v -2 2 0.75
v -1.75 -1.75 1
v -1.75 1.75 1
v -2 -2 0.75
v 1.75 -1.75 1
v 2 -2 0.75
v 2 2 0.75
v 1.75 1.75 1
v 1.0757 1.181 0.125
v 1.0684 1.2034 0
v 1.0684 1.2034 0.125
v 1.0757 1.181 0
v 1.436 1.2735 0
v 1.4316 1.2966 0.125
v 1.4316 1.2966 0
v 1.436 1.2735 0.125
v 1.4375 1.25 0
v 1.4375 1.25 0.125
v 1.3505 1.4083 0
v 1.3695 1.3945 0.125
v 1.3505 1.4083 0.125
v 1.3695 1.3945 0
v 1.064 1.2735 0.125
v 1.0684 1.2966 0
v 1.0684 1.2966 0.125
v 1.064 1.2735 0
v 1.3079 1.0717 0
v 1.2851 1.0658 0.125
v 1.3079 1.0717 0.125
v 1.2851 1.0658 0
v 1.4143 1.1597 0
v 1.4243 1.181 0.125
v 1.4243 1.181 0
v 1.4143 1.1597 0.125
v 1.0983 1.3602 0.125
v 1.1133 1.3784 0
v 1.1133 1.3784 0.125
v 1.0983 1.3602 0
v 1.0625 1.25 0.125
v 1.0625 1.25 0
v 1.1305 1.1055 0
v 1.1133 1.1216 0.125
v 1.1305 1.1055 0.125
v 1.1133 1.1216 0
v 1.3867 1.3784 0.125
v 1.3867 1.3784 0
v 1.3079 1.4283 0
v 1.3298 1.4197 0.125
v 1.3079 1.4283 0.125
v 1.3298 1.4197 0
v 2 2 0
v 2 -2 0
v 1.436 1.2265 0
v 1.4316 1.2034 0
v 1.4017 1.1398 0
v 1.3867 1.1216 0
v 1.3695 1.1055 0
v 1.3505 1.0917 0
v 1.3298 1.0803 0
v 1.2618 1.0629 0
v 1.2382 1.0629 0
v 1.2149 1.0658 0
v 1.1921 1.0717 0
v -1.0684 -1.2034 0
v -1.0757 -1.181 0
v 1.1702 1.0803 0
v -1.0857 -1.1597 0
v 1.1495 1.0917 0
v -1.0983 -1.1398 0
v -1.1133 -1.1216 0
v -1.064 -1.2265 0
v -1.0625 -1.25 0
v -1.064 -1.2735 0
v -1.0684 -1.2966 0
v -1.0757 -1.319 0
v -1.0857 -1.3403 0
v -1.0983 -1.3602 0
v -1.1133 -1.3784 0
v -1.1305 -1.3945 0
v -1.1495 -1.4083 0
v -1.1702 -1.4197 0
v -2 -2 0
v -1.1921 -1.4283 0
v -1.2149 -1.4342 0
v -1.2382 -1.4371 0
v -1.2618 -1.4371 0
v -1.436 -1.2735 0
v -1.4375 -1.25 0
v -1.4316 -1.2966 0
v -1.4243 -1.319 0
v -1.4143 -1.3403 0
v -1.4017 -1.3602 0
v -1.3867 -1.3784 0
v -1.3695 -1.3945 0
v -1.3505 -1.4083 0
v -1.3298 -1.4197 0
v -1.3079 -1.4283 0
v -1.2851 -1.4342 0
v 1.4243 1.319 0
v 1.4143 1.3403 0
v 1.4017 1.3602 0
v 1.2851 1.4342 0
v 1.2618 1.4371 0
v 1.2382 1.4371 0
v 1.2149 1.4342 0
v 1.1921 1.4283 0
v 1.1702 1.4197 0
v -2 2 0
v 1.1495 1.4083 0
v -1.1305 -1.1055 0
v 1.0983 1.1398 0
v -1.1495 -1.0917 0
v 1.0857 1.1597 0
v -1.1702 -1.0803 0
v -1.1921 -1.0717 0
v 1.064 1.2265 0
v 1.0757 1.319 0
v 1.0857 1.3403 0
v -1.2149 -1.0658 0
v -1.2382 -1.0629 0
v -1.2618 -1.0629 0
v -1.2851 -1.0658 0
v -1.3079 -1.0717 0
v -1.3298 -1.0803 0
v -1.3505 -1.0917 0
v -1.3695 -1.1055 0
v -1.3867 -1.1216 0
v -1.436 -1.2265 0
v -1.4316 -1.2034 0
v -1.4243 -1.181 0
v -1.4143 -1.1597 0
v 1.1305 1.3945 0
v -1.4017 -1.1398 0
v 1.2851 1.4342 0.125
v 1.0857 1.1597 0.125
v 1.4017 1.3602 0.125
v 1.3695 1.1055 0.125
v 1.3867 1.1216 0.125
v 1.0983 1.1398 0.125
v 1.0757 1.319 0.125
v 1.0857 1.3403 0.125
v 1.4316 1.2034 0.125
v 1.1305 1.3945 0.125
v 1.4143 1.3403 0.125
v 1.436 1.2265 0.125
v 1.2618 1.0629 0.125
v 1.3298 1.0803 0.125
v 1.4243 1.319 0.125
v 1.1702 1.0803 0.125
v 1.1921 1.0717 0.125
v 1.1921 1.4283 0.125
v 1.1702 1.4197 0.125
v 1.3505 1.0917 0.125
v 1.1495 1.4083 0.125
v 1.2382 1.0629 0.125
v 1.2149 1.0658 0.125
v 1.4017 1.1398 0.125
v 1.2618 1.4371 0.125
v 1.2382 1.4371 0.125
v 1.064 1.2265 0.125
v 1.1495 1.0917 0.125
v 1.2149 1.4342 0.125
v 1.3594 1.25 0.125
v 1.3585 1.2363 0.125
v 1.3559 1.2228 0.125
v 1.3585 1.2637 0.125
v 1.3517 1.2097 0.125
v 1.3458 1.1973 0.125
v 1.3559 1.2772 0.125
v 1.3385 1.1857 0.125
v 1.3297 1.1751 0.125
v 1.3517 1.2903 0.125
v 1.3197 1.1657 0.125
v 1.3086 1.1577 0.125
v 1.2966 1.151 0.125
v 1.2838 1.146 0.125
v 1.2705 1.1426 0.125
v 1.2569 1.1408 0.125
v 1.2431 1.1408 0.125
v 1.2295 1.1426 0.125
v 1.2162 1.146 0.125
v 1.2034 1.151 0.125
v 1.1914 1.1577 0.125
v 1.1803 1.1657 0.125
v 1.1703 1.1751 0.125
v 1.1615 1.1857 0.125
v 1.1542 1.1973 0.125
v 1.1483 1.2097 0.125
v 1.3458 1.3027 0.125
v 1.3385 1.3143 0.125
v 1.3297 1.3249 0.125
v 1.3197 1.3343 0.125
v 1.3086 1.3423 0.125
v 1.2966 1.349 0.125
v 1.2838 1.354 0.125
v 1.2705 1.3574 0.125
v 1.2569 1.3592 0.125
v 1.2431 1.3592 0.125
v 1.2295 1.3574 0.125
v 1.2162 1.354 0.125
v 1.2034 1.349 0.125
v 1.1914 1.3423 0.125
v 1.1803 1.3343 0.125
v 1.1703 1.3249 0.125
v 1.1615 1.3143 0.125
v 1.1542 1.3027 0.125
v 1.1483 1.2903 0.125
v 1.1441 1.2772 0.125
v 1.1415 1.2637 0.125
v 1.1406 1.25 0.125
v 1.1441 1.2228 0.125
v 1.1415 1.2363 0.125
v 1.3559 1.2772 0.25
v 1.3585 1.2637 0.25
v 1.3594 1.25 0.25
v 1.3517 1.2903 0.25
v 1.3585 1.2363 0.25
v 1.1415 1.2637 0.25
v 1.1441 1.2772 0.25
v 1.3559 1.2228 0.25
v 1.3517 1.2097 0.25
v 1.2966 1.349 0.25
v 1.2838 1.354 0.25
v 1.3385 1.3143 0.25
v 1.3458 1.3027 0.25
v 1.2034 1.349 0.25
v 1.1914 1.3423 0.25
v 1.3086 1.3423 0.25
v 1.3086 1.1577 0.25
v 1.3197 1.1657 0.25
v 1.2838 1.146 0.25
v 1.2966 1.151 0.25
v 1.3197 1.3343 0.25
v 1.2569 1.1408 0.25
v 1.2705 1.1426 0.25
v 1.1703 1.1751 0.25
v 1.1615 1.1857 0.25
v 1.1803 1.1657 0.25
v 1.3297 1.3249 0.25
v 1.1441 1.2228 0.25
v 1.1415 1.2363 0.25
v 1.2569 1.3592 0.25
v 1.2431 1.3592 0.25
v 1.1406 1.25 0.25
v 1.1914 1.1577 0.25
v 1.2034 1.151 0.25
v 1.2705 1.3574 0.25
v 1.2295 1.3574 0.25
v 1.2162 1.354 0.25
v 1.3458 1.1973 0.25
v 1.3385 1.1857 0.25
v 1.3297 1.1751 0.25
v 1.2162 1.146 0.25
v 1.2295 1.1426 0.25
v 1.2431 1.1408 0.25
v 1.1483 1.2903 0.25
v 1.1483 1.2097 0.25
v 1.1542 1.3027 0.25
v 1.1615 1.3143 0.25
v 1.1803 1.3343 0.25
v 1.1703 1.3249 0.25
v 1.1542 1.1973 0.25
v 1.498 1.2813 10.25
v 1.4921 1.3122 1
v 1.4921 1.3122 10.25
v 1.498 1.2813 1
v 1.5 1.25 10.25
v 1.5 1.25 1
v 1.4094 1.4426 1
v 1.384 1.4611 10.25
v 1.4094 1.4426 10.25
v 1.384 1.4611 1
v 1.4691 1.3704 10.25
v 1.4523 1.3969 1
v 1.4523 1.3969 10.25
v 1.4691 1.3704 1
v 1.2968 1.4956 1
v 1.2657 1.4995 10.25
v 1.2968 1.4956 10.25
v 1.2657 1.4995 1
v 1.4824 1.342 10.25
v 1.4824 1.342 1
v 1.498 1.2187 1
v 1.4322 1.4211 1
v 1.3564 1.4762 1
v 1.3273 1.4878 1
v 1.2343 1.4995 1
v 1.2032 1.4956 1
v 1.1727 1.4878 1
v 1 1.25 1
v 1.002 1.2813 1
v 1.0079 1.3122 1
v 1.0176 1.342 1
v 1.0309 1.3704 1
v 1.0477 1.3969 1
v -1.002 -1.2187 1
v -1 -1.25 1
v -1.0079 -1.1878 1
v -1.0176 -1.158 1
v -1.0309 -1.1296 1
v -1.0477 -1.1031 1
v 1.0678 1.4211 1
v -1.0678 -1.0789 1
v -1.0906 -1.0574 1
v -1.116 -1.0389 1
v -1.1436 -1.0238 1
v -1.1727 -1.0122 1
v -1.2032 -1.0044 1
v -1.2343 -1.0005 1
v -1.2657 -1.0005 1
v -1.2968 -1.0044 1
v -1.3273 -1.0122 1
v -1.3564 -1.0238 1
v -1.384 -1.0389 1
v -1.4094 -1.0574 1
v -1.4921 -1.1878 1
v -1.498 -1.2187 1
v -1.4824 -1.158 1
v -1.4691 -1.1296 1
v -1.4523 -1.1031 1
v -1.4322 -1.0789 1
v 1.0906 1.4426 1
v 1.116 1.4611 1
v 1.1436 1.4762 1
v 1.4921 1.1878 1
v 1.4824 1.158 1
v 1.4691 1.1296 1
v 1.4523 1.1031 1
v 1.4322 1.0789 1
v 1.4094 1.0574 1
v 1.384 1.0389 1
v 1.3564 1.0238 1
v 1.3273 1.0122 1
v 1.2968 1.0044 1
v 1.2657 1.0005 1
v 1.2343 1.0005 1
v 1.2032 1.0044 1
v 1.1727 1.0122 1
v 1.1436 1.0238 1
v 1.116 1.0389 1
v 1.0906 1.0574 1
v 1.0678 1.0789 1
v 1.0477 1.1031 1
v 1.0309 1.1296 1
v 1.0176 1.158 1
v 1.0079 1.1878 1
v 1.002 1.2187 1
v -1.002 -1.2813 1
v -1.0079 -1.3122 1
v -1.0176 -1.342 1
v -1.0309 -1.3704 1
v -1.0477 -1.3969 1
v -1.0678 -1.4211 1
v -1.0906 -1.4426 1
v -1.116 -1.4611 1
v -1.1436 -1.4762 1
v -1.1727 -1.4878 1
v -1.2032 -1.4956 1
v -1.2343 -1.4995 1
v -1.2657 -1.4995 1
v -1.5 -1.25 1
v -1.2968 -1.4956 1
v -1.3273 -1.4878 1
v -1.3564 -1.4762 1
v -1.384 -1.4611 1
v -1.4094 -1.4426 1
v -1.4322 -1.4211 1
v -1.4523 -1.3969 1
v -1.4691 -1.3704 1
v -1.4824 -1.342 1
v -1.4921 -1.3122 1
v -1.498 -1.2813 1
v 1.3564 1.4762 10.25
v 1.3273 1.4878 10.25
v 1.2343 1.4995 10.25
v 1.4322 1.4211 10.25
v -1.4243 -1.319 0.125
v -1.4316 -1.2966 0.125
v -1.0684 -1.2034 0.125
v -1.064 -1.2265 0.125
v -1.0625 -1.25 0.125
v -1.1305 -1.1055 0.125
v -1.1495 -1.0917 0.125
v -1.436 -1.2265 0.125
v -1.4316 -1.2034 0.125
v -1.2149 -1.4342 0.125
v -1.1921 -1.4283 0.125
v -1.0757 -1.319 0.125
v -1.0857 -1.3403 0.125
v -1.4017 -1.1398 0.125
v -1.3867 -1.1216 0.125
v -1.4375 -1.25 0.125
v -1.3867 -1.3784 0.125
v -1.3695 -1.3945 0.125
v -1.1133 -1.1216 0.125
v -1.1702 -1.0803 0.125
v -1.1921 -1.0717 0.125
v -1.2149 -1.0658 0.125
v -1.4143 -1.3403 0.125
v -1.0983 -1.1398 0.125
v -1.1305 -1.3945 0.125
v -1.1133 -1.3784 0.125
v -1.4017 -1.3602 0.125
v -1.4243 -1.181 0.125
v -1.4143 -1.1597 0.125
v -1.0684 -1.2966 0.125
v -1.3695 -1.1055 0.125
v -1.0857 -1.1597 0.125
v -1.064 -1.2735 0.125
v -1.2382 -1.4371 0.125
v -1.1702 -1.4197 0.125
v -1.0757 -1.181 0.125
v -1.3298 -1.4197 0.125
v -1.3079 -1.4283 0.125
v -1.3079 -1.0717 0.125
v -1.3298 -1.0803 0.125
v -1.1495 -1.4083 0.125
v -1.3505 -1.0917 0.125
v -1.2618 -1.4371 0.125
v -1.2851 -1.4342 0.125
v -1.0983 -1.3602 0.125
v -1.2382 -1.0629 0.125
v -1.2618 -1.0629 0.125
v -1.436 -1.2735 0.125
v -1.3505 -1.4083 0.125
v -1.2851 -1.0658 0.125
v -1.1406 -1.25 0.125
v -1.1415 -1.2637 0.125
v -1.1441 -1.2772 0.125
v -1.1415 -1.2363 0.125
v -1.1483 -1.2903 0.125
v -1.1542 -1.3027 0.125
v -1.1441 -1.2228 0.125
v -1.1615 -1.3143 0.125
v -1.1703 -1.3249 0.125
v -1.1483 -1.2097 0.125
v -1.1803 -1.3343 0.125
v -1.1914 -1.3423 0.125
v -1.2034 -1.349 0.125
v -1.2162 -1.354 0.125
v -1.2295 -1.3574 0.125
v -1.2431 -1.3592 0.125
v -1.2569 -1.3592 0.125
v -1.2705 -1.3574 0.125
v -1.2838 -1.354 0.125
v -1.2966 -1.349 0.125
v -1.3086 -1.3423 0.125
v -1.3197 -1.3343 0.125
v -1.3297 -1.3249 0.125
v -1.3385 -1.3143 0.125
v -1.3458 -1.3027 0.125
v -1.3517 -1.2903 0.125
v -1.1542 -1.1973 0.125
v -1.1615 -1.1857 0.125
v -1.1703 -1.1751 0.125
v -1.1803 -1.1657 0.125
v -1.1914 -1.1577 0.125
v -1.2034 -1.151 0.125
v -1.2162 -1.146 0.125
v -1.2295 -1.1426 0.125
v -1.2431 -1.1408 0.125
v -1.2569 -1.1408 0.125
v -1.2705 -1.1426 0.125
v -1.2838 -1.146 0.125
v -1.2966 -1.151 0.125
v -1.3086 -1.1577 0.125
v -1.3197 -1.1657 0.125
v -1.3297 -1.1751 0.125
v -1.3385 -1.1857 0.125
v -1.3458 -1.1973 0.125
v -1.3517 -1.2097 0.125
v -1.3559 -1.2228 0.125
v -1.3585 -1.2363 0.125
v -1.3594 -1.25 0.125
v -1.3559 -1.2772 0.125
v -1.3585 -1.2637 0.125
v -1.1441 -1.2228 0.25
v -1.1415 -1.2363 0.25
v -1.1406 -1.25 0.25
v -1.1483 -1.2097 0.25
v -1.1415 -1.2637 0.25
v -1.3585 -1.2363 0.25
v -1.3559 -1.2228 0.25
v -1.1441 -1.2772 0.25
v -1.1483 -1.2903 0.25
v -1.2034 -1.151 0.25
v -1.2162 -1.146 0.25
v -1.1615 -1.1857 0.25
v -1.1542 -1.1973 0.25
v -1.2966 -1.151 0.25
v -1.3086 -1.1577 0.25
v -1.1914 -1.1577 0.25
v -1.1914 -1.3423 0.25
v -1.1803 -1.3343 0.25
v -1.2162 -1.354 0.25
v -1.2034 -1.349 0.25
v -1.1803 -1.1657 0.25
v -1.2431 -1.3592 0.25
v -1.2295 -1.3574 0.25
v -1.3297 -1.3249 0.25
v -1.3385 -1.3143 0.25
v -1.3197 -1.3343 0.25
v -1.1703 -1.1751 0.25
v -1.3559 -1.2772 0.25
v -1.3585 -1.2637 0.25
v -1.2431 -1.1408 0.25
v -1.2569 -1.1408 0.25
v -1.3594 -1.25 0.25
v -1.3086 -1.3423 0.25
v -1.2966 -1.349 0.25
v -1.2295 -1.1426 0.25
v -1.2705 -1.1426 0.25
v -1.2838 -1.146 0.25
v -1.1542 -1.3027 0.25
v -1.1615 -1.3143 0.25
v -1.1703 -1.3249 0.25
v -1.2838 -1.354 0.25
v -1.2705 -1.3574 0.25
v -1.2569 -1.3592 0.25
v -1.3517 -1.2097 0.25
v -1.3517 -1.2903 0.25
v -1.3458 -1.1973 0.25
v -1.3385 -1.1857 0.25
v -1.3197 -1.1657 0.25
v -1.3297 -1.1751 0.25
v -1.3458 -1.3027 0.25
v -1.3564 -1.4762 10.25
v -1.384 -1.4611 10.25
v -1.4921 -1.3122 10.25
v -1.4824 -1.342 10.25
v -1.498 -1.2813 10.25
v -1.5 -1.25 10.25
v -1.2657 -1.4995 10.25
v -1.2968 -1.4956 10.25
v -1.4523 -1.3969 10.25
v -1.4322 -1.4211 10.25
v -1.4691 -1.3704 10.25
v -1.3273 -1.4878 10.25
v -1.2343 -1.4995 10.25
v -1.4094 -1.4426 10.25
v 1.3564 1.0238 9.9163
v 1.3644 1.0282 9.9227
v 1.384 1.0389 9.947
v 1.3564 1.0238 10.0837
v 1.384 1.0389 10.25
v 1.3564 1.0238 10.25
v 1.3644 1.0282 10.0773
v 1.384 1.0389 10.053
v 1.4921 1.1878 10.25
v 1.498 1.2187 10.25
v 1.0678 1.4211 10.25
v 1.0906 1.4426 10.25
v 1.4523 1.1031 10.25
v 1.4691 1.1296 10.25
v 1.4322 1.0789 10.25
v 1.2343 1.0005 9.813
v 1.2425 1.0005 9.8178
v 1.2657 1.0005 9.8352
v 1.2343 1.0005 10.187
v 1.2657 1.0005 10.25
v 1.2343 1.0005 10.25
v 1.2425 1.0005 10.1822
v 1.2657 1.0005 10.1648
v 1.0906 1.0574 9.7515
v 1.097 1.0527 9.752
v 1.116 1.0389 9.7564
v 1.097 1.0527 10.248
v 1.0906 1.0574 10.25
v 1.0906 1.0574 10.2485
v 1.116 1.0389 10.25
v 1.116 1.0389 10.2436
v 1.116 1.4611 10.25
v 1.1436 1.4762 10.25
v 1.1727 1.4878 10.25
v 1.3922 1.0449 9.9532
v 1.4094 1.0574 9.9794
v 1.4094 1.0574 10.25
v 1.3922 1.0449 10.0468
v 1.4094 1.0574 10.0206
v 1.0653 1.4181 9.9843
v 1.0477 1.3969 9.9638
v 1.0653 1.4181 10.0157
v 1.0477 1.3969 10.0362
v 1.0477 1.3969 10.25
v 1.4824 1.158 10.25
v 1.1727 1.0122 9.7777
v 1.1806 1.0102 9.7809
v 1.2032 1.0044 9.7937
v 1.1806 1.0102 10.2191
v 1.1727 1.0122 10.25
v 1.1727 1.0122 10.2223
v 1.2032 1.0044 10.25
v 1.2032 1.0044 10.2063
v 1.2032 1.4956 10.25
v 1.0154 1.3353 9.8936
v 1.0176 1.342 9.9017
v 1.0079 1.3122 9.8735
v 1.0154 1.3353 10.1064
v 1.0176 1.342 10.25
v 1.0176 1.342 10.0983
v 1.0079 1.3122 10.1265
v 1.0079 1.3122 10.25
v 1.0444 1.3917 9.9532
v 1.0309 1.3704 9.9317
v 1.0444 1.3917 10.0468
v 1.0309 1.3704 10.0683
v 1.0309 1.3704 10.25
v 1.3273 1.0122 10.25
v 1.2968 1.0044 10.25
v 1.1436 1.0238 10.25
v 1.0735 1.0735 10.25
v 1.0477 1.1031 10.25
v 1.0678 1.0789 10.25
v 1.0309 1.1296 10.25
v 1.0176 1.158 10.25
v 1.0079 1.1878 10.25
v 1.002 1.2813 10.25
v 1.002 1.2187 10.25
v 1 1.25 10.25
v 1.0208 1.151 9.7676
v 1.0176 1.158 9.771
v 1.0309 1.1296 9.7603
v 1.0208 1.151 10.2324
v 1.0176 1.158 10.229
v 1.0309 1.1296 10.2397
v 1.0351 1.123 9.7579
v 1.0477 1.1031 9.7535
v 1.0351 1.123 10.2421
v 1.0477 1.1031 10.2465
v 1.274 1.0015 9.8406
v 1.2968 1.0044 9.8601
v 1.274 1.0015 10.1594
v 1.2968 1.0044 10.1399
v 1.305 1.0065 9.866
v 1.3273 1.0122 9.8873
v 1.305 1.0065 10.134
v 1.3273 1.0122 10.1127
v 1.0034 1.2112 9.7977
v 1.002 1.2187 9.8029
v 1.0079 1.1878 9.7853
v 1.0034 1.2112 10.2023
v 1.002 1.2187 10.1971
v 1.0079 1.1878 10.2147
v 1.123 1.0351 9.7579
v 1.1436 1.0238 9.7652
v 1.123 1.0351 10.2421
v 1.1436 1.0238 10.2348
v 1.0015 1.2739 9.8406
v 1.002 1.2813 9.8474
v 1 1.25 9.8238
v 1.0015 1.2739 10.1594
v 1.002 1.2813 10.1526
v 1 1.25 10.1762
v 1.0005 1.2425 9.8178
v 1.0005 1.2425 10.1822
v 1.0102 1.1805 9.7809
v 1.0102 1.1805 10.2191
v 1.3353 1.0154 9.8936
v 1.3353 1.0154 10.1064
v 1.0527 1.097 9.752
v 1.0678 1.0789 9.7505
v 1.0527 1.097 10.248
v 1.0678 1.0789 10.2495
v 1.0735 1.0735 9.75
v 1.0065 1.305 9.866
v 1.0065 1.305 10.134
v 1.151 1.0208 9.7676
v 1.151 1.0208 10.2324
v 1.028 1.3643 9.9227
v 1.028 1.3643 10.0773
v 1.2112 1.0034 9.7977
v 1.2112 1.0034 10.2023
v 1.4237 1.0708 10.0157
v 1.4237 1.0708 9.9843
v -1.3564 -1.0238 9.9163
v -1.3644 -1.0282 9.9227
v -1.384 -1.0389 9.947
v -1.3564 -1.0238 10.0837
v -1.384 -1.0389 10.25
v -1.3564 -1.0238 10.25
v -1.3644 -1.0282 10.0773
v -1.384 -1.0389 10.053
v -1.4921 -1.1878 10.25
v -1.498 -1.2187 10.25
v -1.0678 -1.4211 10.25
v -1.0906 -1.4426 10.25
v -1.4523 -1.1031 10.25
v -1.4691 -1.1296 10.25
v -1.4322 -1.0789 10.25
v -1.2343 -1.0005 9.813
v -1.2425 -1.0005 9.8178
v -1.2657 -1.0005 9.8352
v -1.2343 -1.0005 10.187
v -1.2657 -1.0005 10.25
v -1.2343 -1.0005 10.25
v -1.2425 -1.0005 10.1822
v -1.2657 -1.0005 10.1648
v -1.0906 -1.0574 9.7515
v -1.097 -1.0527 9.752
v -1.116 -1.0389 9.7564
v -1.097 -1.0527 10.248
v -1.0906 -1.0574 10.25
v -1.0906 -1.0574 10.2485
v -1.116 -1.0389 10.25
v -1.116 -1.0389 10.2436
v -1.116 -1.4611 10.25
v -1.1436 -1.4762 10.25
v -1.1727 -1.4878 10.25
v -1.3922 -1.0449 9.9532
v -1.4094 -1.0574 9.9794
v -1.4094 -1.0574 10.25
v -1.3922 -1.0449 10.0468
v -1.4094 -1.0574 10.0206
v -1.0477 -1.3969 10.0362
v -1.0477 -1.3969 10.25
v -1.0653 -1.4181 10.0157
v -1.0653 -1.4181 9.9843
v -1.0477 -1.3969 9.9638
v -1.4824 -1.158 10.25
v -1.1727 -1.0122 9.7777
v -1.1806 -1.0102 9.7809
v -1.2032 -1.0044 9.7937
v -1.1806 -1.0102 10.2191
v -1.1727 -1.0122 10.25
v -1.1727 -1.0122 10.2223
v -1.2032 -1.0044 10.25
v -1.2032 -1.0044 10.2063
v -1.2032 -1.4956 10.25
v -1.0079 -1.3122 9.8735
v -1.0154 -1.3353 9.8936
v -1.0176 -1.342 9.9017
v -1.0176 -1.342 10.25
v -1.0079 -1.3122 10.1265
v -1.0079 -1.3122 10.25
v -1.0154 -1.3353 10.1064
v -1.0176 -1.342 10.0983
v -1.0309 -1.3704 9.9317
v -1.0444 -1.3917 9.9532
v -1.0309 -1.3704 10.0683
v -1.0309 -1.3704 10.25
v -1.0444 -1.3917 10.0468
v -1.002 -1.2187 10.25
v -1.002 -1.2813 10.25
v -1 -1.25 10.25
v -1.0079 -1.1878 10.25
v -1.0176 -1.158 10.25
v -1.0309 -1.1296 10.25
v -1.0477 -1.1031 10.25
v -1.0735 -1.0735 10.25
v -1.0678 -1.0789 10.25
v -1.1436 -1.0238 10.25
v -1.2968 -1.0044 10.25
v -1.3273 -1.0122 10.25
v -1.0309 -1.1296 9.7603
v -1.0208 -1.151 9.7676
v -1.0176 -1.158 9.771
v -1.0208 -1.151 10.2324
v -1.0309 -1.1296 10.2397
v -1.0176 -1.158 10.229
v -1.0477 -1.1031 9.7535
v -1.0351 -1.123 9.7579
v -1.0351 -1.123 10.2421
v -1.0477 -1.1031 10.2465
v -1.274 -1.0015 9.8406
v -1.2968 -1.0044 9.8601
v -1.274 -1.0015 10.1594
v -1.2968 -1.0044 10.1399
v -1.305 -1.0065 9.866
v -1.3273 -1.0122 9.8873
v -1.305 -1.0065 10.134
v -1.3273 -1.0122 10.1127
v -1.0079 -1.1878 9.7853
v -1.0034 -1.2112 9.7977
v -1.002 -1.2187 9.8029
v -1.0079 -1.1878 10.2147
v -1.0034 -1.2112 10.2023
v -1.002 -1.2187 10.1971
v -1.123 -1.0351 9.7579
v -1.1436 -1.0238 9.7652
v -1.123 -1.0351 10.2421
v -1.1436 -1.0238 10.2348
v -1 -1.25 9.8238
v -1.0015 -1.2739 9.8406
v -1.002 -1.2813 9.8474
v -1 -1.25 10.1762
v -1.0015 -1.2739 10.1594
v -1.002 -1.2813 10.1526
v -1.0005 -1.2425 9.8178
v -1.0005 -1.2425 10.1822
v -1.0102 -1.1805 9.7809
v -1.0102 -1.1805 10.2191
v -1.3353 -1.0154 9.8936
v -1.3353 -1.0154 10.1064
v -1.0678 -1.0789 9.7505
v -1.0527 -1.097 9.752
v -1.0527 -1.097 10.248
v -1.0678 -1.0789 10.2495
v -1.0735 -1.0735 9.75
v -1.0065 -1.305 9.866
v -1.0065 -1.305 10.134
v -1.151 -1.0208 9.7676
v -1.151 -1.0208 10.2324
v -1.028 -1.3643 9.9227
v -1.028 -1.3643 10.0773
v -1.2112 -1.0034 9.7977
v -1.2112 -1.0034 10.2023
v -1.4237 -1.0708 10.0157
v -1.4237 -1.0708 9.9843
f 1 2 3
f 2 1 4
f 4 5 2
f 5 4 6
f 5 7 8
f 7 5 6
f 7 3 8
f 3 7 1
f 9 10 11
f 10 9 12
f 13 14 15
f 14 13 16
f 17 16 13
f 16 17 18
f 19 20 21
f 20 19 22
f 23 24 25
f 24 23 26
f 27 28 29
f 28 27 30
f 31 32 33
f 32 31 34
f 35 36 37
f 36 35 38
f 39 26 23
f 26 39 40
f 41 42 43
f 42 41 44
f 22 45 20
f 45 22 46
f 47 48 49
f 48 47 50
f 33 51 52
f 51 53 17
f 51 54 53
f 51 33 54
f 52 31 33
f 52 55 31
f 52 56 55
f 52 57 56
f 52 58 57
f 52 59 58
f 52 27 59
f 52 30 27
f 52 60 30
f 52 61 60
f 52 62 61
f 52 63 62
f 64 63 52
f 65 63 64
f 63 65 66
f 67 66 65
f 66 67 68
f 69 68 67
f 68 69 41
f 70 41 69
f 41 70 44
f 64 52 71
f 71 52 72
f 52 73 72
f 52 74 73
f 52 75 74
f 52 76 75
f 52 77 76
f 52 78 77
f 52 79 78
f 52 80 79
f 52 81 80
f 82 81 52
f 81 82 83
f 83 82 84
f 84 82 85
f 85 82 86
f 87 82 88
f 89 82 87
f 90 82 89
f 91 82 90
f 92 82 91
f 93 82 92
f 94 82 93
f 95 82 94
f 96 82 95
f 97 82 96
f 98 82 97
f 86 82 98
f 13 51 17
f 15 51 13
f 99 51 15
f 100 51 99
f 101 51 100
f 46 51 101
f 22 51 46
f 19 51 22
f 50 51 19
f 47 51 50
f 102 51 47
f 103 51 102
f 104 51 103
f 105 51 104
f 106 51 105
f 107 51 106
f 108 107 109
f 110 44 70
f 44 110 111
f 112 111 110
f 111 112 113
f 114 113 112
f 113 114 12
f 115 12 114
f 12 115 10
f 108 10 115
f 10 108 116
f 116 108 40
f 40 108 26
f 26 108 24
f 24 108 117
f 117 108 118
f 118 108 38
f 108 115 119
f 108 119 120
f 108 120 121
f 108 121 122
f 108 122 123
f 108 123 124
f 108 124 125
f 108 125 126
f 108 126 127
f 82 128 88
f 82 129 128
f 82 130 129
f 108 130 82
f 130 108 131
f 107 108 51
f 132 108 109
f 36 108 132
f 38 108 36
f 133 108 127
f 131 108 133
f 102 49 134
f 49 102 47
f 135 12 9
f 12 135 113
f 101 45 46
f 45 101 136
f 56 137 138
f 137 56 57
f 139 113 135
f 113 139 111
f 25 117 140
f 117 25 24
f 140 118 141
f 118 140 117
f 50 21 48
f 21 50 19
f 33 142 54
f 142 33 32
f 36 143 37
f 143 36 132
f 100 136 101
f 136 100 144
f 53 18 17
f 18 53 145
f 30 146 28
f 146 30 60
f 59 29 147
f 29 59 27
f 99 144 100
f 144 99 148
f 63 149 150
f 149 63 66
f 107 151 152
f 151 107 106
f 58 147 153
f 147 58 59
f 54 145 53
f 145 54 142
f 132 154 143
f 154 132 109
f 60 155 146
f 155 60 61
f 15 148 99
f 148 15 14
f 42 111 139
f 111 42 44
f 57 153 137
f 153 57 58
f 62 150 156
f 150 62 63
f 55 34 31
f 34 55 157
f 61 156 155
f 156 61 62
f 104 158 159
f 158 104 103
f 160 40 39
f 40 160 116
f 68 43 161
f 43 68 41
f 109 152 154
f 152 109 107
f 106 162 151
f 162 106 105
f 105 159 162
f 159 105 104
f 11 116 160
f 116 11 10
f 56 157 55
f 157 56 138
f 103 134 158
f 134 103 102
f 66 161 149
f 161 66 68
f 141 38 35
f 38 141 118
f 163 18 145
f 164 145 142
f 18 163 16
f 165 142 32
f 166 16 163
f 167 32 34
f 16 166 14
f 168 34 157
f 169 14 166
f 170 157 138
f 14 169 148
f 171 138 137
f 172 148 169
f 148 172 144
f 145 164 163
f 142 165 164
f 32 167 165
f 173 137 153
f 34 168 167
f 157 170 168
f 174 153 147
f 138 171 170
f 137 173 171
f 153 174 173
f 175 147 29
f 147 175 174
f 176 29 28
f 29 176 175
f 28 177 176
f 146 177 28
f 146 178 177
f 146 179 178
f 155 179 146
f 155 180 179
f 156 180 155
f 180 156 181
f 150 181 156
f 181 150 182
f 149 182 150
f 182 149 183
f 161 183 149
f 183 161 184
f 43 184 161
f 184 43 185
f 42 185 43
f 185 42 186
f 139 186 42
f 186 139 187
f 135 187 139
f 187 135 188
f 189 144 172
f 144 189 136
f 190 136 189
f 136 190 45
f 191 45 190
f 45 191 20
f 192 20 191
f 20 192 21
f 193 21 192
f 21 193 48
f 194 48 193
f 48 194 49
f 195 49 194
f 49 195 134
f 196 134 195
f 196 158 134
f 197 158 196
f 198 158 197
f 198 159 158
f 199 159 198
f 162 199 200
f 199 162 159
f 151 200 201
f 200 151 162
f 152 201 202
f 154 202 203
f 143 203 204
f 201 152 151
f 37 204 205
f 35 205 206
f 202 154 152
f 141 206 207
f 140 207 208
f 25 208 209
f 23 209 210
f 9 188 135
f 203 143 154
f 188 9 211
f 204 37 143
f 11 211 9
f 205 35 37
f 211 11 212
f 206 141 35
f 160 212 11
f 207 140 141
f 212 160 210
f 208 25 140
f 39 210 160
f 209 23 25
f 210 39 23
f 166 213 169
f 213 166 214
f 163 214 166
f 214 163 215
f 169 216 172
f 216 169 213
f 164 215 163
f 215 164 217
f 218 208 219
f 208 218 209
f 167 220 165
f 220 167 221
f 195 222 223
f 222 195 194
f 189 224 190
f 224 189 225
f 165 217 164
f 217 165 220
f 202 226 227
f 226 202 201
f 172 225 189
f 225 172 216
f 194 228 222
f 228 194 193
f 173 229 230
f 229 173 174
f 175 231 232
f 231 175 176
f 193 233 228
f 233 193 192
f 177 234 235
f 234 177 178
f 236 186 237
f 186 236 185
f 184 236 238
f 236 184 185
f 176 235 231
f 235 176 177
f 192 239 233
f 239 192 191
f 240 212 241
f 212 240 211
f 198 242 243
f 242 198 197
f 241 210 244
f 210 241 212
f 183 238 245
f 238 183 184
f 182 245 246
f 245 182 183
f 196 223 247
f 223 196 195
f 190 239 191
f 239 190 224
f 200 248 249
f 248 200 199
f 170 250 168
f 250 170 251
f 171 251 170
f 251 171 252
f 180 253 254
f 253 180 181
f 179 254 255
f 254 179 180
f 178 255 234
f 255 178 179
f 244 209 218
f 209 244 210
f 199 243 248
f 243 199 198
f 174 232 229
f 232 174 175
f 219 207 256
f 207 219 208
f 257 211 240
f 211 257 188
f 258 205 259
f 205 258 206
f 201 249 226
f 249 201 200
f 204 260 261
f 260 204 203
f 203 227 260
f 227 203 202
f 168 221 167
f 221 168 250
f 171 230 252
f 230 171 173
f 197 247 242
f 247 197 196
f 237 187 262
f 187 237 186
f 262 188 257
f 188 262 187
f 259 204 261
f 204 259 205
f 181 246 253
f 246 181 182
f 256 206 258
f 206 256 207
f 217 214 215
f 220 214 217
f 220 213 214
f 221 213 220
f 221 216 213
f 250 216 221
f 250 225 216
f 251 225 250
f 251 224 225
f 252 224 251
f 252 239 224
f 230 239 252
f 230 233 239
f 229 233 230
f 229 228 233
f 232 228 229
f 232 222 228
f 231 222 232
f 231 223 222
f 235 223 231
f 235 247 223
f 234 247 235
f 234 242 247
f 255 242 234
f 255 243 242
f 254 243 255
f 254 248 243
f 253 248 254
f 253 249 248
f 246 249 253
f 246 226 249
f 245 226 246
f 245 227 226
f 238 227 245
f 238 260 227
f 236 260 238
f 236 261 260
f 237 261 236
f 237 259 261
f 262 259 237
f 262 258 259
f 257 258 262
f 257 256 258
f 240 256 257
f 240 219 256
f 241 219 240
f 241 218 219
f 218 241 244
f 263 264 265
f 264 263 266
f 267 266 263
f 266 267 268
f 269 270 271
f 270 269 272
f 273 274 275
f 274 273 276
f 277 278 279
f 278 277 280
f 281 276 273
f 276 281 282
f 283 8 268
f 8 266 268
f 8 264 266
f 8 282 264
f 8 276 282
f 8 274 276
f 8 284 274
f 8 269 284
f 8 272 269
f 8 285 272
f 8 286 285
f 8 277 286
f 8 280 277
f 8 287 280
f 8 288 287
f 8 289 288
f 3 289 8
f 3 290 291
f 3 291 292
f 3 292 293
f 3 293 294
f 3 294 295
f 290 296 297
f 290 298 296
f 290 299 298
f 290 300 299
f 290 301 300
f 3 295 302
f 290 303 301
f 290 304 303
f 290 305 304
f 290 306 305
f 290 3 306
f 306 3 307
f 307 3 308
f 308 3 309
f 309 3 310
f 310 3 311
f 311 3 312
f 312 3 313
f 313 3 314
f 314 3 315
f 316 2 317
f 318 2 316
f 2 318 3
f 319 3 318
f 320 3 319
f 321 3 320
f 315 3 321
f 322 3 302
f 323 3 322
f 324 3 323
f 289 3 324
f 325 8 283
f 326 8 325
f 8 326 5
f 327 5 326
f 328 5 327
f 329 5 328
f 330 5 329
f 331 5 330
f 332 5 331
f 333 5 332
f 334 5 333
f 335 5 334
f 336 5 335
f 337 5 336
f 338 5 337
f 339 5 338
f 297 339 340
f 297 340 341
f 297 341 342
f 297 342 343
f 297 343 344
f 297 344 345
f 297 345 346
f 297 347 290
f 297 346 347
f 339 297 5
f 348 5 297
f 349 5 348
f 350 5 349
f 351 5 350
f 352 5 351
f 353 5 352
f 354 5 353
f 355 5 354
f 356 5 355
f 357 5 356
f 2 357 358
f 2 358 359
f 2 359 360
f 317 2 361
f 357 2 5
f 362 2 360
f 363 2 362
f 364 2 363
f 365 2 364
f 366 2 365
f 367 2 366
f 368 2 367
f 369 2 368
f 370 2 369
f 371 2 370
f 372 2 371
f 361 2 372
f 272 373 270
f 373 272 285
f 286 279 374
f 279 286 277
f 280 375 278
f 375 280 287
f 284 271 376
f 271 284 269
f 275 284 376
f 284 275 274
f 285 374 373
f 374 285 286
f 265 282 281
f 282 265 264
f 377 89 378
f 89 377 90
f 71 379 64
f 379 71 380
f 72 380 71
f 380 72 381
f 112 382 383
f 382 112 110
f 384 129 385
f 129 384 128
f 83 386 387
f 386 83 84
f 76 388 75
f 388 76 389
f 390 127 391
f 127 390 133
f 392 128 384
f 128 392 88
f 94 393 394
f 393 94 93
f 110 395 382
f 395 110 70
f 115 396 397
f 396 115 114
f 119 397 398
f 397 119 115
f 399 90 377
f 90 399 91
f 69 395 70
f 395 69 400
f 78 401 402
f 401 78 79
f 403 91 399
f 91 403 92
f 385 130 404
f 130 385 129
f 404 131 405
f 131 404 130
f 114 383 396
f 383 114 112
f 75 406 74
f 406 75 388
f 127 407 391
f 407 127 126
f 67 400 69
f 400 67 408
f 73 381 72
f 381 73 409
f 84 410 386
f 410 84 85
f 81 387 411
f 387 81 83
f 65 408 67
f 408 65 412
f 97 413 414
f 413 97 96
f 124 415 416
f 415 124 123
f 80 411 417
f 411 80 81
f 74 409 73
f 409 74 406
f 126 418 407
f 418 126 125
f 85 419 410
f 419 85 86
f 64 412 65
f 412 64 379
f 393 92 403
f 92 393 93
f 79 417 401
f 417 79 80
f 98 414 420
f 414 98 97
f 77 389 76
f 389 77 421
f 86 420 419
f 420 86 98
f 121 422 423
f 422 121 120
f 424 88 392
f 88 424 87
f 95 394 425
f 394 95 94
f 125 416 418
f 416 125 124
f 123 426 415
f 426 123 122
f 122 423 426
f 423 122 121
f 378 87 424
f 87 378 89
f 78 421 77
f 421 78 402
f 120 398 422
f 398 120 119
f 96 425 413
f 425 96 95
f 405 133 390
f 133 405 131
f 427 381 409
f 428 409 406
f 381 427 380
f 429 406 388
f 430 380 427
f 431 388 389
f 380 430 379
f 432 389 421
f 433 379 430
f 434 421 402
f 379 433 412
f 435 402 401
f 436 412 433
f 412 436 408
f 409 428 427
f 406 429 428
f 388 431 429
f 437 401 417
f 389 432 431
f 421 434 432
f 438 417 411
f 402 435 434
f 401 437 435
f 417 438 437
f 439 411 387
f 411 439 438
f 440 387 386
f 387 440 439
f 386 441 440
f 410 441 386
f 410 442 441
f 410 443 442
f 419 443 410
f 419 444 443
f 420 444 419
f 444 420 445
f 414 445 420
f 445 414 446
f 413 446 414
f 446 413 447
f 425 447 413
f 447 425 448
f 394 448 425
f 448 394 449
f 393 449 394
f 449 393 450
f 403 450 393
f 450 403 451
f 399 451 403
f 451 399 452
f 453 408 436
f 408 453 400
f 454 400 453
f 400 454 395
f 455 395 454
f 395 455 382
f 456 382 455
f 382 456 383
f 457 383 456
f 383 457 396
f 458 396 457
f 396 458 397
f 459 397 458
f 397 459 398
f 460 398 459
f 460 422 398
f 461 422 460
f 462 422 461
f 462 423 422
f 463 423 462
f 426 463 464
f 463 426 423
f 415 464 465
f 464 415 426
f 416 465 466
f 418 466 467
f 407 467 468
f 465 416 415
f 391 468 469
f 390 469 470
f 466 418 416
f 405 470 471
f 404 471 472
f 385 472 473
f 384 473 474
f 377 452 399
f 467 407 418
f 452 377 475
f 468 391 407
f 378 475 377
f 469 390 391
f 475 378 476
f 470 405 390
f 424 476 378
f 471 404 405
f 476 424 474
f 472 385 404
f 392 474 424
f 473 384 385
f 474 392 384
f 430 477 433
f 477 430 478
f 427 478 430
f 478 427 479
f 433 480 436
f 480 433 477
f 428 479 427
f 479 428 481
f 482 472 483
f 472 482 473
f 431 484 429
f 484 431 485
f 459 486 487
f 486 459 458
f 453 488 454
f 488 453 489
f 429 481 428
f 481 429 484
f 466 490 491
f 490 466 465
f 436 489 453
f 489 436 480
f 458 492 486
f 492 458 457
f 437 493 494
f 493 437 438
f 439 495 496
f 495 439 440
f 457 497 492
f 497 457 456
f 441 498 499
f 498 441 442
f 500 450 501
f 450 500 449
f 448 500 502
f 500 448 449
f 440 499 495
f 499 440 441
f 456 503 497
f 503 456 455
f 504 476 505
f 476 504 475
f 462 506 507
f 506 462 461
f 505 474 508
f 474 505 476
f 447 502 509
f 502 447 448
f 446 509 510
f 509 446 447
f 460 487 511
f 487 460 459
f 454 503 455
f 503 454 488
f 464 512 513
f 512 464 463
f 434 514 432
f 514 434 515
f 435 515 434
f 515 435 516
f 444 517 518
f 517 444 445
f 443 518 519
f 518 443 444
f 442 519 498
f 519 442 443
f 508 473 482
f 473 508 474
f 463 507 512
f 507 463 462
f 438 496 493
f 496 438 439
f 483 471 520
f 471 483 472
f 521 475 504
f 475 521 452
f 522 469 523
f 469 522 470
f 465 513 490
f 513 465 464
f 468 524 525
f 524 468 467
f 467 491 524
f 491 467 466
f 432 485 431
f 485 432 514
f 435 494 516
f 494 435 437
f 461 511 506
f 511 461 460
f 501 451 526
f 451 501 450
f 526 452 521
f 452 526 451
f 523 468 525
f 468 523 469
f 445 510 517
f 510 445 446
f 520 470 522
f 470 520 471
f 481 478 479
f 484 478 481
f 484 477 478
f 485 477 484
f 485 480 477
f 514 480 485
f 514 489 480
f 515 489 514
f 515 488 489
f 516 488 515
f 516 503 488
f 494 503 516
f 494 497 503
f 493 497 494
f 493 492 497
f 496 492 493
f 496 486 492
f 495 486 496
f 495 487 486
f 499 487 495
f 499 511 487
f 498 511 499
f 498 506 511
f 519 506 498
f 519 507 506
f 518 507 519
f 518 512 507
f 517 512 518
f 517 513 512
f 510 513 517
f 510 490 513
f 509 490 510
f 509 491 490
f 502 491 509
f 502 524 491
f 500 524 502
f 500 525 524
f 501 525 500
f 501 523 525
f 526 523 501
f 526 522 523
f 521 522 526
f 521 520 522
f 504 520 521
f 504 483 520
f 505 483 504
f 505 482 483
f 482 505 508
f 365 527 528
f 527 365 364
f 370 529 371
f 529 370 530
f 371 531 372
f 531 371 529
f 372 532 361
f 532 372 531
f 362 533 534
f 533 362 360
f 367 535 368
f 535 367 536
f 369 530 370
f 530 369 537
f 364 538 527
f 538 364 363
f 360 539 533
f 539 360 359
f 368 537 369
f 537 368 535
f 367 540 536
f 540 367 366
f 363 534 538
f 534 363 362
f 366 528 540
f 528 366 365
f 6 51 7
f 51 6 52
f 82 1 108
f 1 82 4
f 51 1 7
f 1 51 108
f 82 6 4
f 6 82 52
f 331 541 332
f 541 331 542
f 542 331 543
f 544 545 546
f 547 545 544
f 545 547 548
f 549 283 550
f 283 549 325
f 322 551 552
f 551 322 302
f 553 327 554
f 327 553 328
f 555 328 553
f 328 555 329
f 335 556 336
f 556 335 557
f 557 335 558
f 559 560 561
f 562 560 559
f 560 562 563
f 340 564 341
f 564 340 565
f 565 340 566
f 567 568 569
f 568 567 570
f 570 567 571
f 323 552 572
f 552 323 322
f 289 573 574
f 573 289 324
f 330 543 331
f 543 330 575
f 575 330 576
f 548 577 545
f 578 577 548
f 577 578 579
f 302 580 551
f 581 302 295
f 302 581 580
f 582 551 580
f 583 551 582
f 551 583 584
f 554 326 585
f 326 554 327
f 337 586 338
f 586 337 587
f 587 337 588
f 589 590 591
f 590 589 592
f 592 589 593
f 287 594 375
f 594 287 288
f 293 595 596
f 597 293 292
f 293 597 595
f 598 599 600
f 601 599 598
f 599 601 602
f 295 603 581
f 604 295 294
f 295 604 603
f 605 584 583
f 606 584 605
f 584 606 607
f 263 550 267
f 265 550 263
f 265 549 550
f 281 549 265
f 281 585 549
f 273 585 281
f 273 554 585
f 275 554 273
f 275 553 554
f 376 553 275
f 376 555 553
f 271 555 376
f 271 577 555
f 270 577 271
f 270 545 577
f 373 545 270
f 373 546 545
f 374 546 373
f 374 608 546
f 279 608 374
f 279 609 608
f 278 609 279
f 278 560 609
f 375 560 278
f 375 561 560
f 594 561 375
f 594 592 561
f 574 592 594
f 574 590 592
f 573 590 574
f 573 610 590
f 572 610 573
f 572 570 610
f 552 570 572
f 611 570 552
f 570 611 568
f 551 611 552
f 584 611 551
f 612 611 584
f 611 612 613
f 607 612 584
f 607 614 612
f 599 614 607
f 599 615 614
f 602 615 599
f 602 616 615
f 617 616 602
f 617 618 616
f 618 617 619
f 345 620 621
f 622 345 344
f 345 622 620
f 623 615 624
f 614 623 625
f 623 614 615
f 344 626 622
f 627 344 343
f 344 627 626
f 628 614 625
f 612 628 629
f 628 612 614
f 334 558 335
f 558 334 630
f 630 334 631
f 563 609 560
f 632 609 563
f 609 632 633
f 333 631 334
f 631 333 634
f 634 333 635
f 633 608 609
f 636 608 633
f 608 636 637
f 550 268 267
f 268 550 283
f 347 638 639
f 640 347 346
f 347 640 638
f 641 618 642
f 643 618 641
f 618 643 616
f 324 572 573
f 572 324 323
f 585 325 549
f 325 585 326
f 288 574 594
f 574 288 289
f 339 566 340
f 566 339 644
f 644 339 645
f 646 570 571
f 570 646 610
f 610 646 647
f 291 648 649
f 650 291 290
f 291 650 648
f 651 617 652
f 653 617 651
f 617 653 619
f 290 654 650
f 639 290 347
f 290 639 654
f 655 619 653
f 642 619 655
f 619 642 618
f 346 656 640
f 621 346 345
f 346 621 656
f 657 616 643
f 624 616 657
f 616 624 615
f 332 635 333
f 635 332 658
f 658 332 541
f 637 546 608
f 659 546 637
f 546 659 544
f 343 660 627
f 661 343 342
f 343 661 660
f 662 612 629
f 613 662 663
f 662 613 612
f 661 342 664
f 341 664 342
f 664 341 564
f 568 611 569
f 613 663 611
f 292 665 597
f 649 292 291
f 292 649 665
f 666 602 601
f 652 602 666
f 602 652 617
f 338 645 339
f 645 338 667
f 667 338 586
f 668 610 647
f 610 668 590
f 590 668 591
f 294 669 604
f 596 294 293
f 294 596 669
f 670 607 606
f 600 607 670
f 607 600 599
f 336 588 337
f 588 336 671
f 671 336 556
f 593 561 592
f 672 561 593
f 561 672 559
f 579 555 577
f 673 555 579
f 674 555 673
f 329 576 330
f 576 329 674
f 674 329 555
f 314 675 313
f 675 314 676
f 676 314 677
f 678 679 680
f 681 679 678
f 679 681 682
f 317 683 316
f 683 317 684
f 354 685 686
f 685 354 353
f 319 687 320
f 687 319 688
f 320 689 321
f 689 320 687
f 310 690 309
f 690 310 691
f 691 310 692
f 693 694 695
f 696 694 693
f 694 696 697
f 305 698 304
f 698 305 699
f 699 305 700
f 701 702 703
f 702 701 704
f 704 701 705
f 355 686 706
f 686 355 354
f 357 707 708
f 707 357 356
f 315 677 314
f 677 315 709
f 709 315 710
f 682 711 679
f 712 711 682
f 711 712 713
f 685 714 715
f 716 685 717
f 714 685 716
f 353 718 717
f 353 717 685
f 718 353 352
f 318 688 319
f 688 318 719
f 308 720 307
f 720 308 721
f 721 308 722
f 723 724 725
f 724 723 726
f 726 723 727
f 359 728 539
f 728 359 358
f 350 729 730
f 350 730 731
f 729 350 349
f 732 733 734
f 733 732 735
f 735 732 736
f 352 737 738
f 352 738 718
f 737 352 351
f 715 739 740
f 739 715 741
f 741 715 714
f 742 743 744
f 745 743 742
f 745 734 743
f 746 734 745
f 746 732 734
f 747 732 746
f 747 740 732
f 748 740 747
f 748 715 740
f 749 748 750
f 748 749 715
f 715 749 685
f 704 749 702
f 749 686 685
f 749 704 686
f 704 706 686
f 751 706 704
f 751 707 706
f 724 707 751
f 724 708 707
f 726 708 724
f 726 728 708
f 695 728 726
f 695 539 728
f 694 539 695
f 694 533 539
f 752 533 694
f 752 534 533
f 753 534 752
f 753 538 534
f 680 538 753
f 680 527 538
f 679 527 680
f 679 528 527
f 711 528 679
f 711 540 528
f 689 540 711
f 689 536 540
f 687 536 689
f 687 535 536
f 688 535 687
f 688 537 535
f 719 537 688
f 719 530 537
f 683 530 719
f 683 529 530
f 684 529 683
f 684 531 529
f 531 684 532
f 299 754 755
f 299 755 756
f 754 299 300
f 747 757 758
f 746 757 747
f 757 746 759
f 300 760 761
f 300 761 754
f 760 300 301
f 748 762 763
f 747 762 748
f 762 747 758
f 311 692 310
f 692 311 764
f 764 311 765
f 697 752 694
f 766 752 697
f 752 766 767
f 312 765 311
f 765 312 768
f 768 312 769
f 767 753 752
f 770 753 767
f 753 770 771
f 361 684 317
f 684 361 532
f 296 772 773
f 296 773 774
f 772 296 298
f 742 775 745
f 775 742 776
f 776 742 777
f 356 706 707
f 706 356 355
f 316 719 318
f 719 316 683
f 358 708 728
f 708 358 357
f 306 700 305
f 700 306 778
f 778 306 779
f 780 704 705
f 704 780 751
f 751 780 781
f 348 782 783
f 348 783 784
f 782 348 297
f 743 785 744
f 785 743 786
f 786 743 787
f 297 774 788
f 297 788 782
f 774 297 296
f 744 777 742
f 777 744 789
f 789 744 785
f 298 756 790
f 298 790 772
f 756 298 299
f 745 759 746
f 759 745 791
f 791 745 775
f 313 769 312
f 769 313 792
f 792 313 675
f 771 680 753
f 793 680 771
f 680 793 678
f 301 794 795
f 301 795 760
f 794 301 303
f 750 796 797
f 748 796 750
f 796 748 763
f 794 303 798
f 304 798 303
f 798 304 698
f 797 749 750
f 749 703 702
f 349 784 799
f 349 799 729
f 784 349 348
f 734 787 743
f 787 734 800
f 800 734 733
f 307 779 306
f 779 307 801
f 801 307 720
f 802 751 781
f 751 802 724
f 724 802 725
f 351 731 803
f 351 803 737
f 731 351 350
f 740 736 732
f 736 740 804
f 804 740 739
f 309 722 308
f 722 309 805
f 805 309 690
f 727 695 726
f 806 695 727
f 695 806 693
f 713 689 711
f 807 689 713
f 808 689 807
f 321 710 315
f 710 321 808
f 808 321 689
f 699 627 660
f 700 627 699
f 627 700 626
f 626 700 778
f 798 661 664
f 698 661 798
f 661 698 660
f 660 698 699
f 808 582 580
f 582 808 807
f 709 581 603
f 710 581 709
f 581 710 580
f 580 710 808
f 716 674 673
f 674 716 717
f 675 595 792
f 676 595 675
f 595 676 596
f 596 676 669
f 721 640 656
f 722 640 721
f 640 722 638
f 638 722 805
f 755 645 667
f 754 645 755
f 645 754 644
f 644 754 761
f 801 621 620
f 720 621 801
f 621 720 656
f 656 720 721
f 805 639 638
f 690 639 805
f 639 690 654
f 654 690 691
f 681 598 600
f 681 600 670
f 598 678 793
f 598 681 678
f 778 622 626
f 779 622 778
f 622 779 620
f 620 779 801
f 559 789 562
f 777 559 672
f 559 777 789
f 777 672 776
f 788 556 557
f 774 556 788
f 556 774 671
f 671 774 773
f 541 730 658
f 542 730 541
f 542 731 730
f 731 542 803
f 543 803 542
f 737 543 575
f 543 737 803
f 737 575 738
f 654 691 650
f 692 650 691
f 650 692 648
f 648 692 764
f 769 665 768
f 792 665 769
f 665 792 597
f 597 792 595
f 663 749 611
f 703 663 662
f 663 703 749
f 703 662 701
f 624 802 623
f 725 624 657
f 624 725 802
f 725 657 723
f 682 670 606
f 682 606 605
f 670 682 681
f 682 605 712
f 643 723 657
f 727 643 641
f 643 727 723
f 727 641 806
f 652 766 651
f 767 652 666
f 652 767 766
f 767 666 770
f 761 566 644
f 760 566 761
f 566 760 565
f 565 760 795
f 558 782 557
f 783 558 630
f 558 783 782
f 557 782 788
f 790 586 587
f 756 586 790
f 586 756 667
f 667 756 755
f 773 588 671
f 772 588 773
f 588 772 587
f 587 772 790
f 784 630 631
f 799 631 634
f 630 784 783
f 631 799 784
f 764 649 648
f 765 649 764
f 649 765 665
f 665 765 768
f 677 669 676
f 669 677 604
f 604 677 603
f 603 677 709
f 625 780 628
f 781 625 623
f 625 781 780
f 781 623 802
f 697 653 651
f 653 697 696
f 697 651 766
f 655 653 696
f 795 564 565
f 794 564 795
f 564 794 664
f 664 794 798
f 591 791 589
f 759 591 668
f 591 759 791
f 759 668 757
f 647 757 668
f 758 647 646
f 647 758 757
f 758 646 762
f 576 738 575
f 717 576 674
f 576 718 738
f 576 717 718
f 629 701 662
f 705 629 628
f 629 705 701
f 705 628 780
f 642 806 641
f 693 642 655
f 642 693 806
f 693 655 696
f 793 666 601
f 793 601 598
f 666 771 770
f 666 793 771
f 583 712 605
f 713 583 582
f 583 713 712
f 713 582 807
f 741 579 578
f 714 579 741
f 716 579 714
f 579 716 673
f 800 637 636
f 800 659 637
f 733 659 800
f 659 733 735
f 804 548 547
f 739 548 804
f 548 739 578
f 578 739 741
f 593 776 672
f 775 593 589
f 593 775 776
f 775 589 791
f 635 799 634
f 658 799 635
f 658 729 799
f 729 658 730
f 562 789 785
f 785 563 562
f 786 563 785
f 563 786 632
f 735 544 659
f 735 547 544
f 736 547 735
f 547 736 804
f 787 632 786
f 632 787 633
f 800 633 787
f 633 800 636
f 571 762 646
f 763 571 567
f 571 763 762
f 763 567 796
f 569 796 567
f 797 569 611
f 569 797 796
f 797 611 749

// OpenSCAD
$fn = 50;
stand();

module stand() {
    width = 4;
    length = 4;
    height = 1;

    post_width = 0.5;
    post_scale = 5/16;

    difference() {
        base_block(width, length, height);
        chamfer_pyramid(width, length, height, 0.75*height);
        post_holes(width, length, height, post_width, post_scale);
    }

    // We need to get the lift (1/4) out of post_holes properly.
    frame(width, length, 1/4, post_width, post_scale);
}

module base_block(width, length, height) {
    translate([-width/2, -length/2, 0]) {
        cube([width, length, height]);
    }
}

module chamfer_pyramid(width, length, height, rise) {
    subtract_scale = 1.2;

    cut_width = width*subtract_scale;
    cut_length = length*subtract_scale;
    cut_height = height*1;

    module chamfer_cutter() {
        translate([-width/2, -cut_length/2, rise]) {
            rotate([0, -45, 0]) {
                cube([cut_width, cut_length, cut_height]);
            }
        }
    }

    for(i = [0:3]) {
        rotate([0, 0, 90*i]) {
            chamfer_cutter();
        }
    }
}

module post_holes(width, length, height, post_width, x_y_scale) {
    module hole() {
        // screw_head_height = 3/32;
        screw_head_height = 1/8;
        // screw_head_diameter = 0.312;
        screw_head_diameter = 0.375; // No washer..

        cylinder(h=screw_head_height, r=screw_head_diameter/2);

        // screw_dia = 0.19;
        screw_hole_dia = 7/32; // Or 1/4?
        screw_hole_height = 1/8;

        translate([0, 0, screw_head_height]) {
            cylinder(h=screw_hole_height, r=screw_hole_dia/2);
        }

        screw_stack = screw_head_height + screw_hole_height;
        post_height = height - screw_stack;

        translate([0, 0, screw_stack]) {
            cylinder(h=post_height, r=post_width/2);
        }
    }

    for(i = [x_y_scale, -x_y_scale]) {
        translate([i*width, i*length, 0]) {
            hole();
        }
    }
}

module frame(width, length, lift, post_width, x_y_scale) {
    post_height = 10;
    rise = (post_height + lift) - post_width/2;

    module pins() {
        module pin() {
            pin_diameter = 1/8;
            pin_length = post_width;

            translate([-width*x_y_scale, -length*x_y_scale, rise]) {
                rotate([0, 90, 45]) {
                    cylinder(h = pin_length, d = pin_diameter);
                }
            }
        }

        for (i = [0, 180]) {
            rotate([0, 0, i]) {
                pin();
            }
        }
    }

    module verticals() {
        module vertical() {
            difference() {
                translate([x_y_scale*width, x_y_scale*length, lift]) {
                    cylinder(h = post_height, r = post_width/2);
                }
                pins();
            }
        }

        for (i = [0, 180]) {
            rotate([0, 0, i]) {
                vertical();
            }
        }
    }

    module horizontal() {
        scaled_width = width*x_y_scale;
        scaled_length = length*x_y_scale;

        post_separation = sqrt(pow(scaled_width, 2) + pow(scaled_length, 2))*2;

        module bar() {
            translate([-width*x_y_scale, -length*x_y_scale, rise]) {
                rotate([0, 90, 45]) {
                    cylinder(h = post_separation, r = post_width/2);
                }
            }
        }

        difference() {
            bar();
            verticals();
            pins();
        }
    }

    verticals();
    horizontal();
    pins();
}
